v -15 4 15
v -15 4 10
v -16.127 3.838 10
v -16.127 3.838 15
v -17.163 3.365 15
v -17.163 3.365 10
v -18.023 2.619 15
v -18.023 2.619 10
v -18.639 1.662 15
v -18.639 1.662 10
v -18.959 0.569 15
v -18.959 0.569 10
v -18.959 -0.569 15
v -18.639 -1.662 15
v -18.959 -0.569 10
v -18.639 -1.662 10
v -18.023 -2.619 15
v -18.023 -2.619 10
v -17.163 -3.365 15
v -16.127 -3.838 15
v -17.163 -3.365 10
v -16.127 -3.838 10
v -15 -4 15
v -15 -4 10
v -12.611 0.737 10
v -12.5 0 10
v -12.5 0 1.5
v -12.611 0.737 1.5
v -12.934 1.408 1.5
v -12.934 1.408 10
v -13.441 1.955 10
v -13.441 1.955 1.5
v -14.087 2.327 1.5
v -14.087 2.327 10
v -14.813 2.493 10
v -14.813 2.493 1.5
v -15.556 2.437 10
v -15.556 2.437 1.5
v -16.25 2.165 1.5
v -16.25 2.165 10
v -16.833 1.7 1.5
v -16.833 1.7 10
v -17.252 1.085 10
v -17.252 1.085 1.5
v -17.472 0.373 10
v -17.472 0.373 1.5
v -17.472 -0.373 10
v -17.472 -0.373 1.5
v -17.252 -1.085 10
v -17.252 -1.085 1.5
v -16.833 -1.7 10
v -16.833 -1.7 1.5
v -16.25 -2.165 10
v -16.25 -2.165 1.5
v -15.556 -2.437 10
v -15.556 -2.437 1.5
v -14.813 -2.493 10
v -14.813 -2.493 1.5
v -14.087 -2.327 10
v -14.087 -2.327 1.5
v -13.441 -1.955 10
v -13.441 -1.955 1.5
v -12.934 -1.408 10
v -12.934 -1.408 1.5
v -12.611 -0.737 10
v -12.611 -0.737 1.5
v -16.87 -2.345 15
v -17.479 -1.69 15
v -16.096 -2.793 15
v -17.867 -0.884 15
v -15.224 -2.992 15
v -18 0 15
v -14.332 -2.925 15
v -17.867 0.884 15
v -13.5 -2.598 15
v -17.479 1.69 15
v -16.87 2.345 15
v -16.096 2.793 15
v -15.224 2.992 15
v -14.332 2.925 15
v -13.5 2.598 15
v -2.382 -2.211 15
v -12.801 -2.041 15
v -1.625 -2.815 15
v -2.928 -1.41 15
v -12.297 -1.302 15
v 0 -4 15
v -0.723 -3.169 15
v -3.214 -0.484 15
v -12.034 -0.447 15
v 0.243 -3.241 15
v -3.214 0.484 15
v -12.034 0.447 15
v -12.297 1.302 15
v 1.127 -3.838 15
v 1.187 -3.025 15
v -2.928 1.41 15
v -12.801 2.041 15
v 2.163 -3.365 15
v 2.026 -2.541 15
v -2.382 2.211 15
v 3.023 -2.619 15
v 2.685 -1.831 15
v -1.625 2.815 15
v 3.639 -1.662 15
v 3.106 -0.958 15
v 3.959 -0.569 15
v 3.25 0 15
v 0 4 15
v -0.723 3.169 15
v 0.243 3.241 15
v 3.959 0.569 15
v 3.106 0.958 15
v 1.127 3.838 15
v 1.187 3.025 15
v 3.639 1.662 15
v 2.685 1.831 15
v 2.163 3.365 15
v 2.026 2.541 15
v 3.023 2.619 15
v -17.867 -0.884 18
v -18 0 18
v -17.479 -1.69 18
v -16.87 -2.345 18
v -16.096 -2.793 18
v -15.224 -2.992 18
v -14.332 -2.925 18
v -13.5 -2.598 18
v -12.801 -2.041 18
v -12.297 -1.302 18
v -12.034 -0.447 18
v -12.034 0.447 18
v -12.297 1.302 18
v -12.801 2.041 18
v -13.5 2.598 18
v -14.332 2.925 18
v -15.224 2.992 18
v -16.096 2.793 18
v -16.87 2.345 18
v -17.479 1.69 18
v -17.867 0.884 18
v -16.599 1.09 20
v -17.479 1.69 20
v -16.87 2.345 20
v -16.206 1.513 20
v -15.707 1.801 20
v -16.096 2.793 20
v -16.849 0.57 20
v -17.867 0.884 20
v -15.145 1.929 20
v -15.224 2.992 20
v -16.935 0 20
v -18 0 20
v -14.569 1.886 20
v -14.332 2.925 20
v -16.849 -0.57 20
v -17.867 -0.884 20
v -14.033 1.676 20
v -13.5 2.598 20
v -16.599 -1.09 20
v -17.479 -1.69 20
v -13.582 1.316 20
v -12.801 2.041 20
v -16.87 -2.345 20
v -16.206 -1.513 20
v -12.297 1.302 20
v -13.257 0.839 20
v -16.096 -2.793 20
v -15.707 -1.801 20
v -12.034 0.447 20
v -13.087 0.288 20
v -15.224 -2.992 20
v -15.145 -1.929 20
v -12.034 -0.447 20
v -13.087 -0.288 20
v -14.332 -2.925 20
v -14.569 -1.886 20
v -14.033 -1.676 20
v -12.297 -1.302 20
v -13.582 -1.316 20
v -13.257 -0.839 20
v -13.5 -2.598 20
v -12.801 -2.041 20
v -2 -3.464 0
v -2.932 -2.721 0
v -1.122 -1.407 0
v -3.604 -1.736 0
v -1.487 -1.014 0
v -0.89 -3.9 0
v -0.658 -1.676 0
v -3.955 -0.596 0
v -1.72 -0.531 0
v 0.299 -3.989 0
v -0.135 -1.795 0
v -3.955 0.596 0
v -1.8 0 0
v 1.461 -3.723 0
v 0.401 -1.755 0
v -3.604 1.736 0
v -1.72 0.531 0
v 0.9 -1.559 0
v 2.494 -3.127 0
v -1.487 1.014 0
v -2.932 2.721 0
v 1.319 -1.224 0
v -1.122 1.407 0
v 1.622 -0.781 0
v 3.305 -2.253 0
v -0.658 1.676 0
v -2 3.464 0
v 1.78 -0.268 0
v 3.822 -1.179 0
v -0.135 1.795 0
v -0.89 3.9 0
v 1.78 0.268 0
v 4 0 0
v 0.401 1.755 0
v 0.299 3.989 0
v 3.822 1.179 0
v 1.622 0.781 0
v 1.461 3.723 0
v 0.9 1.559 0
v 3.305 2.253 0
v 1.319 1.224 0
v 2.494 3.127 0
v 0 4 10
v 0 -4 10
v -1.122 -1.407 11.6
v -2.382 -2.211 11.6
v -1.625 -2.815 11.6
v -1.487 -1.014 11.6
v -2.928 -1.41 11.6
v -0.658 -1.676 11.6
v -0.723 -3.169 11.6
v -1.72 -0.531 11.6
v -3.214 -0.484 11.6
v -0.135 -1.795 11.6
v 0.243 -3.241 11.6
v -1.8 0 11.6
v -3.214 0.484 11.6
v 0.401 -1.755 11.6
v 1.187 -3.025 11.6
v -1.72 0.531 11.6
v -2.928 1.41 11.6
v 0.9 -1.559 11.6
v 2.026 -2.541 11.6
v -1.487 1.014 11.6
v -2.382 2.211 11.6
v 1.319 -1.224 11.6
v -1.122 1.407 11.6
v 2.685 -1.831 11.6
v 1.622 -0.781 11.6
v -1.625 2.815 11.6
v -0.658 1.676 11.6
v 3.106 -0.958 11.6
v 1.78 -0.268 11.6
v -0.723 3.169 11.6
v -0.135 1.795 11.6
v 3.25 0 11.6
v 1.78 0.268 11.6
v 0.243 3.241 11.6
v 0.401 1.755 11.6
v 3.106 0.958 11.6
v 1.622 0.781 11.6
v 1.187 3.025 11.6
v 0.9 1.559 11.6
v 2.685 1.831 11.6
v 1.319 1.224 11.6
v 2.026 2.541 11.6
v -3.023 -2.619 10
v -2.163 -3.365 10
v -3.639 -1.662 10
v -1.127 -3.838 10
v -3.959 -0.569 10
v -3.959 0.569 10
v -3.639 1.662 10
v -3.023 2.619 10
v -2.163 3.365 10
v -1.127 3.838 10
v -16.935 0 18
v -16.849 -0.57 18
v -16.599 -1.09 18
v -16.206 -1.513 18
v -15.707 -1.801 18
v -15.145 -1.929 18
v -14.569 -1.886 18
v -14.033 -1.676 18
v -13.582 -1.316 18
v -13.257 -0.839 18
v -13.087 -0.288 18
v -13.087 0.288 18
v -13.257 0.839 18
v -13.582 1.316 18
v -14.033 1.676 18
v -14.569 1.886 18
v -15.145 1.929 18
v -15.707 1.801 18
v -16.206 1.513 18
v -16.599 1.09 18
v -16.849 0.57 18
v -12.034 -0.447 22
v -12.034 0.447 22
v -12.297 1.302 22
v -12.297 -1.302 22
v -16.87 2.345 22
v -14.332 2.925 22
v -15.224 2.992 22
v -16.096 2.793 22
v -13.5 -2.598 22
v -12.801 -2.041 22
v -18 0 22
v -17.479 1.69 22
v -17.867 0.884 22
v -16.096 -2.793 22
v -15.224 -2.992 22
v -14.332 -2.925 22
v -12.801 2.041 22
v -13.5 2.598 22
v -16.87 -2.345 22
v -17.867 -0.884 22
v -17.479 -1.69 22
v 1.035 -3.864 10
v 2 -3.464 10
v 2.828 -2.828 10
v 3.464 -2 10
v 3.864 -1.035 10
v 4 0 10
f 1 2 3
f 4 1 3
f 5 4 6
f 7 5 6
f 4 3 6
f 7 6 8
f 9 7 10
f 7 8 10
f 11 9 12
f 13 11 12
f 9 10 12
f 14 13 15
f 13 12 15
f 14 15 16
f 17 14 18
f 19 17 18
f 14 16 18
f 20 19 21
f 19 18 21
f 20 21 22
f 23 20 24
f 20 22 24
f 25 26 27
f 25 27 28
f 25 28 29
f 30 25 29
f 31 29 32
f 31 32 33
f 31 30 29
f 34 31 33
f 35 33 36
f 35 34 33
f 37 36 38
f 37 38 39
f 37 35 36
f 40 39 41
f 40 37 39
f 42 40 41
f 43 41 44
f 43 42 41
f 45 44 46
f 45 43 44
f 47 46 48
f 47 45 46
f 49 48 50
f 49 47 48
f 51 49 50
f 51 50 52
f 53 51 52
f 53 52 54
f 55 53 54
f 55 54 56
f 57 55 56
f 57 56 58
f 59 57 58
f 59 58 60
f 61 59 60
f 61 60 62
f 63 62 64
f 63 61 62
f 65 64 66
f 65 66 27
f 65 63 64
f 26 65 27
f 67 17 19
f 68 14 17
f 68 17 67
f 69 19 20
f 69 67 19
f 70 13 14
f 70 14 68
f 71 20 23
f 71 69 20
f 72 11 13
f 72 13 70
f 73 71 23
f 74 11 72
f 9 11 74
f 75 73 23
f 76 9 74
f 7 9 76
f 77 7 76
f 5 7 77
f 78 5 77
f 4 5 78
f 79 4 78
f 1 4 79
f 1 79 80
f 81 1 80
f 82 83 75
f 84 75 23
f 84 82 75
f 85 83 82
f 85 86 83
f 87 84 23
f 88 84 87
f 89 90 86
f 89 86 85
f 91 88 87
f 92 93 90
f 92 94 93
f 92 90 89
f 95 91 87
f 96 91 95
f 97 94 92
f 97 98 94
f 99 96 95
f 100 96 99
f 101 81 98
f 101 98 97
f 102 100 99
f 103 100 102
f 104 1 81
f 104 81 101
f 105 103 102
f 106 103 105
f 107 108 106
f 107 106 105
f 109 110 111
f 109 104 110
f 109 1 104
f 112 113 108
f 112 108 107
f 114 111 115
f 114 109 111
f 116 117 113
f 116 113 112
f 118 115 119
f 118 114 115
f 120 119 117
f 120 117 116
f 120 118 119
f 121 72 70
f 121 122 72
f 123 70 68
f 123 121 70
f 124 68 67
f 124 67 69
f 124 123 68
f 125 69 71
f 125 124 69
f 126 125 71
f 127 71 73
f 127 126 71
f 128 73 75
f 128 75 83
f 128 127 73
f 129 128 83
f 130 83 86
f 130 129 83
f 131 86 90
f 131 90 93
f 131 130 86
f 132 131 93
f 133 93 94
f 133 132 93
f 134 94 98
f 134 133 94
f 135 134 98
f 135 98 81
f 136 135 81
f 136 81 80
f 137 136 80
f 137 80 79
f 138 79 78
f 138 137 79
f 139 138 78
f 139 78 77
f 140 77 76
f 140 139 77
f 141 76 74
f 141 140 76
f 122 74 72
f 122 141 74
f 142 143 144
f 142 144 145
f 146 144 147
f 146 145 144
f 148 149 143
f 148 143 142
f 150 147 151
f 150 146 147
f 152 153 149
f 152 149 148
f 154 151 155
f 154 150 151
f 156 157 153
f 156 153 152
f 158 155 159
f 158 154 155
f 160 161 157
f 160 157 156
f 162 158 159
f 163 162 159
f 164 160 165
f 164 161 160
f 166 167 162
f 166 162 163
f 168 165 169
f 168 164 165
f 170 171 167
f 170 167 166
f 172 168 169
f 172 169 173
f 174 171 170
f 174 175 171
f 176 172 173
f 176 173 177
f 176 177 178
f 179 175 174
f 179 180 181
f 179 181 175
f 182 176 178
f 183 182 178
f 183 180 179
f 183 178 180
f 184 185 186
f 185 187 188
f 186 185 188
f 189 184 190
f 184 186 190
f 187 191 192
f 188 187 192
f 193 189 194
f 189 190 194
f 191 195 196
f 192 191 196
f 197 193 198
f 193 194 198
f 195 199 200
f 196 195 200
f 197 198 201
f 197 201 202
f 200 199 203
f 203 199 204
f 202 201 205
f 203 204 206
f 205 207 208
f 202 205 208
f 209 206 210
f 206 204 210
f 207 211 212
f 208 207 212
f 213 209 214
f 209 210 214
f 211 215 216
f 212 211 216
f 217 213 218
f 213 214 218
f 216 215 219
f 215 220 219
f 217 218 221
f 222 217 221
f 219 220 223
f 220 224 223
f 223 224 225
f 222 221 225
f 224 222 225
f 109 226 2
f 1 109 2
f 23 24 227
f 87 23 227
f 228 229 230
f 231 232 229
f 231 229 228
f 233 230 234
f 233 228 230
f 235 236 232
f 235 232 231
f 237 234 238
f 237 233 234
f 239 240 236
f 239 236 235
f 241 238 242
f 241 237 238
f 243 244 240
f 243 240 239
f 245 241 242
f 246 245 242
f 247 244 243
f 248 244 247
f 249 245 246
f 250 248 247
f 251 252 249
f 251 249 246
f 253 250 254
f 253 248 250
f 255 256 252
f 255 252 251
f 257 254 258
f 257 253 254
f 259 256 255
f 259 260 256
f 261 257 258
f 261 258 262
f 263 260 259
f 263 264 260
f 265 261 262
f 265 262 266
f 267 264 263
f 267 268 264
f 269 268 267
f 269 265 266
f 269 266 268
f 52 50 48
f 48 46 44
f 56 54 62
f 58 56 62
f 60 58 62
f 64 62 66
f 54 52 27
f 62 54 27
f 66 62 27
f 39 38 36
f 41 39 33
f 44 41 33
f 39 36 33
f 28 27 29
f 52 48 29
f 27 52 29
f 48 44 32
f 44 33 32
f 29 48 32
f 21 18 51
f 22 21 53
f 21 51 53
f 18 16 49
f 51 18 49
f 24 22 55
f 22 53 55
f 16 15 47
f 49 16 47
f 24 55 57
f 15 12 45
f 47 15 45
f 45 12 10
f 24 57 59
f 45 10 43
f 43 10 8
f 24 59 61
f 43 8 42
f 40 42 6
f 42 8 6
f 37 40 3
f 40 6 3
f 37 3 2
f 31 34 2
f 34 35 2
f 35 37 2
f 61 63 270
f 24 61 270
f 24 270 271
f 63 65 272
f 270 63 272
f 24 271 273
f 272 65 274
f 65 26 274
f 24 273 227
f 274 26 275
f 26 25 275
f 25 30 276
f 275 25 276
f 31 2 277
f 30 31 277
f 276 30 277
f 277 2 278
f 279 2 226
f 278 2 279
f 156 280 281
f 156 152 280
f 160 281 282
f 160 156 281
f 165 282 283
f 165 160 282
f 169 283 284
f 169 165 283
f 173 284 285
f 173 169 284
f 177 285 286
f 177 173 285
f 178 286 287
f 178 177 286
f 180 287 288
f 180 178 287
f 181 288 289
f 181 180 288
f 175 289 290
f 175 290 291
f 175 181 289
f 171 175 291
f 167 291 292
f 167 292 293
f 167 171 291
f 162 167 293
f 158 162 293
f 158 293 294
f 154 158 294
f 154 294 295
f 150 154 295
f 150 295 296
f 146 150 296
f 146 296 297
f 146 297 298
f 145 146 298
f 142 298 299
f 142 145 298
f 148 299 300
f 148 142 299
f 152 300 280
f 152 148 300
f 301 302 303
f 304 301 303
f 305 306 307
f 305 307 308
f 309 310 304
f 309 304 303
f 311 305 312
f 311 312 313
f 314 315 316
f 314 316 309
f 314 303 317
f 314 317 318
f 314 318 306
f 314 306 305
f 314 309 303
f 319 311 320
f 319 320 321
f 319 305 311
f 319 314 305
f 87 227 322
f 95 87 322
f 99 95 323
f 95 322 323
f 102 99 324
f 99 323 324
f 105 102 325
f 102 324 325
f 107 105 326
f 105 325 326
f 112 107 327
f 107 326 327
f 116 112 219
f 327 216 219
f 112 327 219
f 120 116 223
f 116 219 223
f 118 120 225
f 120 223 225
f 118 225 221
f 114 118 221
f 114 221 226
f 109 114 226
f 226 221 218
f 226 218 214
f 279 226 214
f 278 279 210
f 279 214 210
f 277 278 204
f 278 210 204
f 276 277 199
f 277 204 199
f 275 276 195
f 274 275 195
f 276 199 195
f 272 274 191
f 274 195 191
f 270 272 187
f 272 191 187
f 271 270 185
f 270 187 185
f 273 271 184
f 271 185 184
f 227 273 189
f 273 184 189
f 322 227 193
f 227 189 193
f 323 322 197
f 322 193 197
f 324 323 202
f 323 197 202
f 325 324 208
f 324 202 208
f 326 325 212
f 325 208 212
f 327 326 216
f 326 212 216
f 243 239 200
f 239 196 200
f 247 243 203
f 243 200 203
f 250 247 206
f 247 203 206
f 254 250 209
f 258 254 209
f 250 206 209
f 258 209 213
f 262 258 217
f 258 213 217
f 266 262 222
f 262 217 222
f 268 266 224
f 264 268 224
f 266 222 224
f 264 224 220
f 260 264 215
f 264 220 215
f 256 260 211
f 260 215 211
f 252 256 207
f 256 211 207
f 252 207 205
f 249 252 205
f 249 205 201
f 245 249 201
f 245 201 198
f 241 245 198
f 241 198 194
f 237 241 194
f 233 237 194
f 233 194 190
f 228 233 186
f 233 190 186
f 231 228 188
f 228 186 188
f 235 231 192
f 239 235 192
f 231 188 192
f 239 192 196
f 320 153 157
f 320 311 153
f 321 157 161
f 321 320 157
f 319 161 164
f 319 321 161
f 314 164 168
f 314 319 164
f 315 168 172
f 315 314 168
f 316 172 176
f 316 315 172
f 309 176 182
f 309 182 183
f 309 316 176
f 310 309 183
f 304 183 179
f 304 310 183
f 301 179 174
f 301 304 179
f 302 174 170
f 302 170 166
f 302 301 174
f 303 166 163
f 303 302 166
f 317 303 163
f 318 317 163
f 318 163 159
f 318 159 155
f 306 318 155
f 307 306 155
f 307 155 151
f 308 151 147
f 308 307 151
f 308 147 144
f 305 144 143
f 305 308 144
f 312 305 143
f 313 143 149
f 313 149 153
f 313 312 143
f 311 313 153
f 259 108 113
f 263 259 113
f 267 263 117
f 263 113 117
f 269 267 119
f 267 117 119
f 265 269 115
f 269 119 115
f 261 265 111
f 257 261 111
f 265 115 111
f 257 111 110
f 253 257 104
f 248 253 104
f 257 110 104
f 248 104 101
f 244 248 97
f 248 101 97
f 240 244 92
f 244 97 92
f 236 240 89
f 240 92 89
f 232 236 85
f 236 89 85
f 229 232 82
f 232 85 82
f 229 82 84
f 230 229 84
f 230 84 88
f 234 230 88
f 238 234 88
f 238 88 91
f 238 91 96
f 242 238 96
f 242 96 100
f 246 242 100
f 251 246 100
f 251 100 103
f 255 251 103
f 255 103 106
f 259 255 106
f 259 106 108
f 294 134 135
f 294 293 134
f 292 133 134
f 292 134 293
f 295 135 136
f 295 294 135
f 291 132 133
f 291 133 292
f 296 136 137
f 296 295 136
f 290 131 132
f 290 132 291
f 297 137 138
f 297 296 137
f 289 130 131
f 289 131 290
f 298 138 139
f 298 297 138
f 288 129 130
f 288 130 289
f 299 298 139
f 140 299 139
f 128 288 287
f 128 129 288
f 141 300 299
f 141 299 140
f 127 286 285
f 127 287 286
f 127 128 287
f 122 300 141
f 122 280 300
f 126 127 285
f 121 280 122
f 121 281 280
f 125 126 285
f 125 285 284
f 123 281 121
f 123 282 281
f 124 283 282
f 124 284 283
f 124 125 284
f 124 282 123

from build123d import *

# Parameters (mm, degrees)
SKETCH1_R                                           = 4
BOSS_EXTRUDE1_DEPTH                                 = 10
BOSS_EXTRUDE2_DEPTH                                 = 5
SKETCH2_3_R                                         = 2.5
BOSS_EXTRUDE3_DEPTH                                 = 8.5
CBORE_FOR_M3_HEX_SOCKET_HEAD_CAP_SCREW1_D           = 3.6
CBORE_FOR_M3_HEX_SOCKET_HEAD_CAP_SCREW1_CBORE_D     = 6.5
CBORE_FOR_M3_HEX_SOCKET_HEAD_CAP_SCREW1_CBORE_DEPTH = 3.4


with BuildPart() as part:
    # Sketch1 → Boss-Extrude1 (new body)
    with BuildSketch(Plane.XY):
        Circle(SKETCH1_R)
    extrude(amount=BOSS_EXTRUDE1_DEPTH)

    # Sketch2 → Boss-Extrude2 (add)
    with BuildSketch(Plane.XY.offset(10)):
        with BuildLine():
            Line((0, 4), (-15, 4))
            ThreePointArc((-15, 4), (-19, 0), (-15, -4))
            Line((-15, -4), (0, -4))
            ThreePointArc((0, -4), (4, 0), (0, 4))
        make_face()
    extrude(amount=BOSS_EXTRUDE2_DEPTH)

    # Sketch2<3> → Boss-Extrude3 (add)
    with BuildSketch(Plane.XY.offset(10)):
        with Locations((-15, 0)):
            Circle(SKETCH2_3_R)
    extrude(amount=-BOSS_EXTRUDE3_DEPTH)

    # CBORE for M3 Hex Socket Head Cap Screw1 (through all)
    with Locations(Plane.XY.offset(15)):
        with Locations((0, 0)):
            CounterBoreHole(CBORE_FOR_M3_HEX_SOCKET_HEAD_CAP_SCREW1_D / 2, CBORE_FOR_M3_HEX_SOCKET_HEAD_CAP_SCREW1_CBORE_D / 2, CBORE_FOR_M3_HEX_SOCKET_HEAD_CAP_SCREW1_CBORE_DEPTH)

    # Sketch6 → Revolve1 (revolve)
    with BuildSketch(Plane(origin=(0, 0, 0), x_dir=(1, 0, 0), z_dir=(0, 1, 0))):
        Polygon((-15, -15), (-18, -15), (-18, -18), (-16.934791303, -18), (-16.934791303, -20), (-18, -20), (-18, -22), (-15, -22), align=None)
    revolve(axis=Axis((-15, 0, 10), (0, 0, 1)))


solid = part.part
